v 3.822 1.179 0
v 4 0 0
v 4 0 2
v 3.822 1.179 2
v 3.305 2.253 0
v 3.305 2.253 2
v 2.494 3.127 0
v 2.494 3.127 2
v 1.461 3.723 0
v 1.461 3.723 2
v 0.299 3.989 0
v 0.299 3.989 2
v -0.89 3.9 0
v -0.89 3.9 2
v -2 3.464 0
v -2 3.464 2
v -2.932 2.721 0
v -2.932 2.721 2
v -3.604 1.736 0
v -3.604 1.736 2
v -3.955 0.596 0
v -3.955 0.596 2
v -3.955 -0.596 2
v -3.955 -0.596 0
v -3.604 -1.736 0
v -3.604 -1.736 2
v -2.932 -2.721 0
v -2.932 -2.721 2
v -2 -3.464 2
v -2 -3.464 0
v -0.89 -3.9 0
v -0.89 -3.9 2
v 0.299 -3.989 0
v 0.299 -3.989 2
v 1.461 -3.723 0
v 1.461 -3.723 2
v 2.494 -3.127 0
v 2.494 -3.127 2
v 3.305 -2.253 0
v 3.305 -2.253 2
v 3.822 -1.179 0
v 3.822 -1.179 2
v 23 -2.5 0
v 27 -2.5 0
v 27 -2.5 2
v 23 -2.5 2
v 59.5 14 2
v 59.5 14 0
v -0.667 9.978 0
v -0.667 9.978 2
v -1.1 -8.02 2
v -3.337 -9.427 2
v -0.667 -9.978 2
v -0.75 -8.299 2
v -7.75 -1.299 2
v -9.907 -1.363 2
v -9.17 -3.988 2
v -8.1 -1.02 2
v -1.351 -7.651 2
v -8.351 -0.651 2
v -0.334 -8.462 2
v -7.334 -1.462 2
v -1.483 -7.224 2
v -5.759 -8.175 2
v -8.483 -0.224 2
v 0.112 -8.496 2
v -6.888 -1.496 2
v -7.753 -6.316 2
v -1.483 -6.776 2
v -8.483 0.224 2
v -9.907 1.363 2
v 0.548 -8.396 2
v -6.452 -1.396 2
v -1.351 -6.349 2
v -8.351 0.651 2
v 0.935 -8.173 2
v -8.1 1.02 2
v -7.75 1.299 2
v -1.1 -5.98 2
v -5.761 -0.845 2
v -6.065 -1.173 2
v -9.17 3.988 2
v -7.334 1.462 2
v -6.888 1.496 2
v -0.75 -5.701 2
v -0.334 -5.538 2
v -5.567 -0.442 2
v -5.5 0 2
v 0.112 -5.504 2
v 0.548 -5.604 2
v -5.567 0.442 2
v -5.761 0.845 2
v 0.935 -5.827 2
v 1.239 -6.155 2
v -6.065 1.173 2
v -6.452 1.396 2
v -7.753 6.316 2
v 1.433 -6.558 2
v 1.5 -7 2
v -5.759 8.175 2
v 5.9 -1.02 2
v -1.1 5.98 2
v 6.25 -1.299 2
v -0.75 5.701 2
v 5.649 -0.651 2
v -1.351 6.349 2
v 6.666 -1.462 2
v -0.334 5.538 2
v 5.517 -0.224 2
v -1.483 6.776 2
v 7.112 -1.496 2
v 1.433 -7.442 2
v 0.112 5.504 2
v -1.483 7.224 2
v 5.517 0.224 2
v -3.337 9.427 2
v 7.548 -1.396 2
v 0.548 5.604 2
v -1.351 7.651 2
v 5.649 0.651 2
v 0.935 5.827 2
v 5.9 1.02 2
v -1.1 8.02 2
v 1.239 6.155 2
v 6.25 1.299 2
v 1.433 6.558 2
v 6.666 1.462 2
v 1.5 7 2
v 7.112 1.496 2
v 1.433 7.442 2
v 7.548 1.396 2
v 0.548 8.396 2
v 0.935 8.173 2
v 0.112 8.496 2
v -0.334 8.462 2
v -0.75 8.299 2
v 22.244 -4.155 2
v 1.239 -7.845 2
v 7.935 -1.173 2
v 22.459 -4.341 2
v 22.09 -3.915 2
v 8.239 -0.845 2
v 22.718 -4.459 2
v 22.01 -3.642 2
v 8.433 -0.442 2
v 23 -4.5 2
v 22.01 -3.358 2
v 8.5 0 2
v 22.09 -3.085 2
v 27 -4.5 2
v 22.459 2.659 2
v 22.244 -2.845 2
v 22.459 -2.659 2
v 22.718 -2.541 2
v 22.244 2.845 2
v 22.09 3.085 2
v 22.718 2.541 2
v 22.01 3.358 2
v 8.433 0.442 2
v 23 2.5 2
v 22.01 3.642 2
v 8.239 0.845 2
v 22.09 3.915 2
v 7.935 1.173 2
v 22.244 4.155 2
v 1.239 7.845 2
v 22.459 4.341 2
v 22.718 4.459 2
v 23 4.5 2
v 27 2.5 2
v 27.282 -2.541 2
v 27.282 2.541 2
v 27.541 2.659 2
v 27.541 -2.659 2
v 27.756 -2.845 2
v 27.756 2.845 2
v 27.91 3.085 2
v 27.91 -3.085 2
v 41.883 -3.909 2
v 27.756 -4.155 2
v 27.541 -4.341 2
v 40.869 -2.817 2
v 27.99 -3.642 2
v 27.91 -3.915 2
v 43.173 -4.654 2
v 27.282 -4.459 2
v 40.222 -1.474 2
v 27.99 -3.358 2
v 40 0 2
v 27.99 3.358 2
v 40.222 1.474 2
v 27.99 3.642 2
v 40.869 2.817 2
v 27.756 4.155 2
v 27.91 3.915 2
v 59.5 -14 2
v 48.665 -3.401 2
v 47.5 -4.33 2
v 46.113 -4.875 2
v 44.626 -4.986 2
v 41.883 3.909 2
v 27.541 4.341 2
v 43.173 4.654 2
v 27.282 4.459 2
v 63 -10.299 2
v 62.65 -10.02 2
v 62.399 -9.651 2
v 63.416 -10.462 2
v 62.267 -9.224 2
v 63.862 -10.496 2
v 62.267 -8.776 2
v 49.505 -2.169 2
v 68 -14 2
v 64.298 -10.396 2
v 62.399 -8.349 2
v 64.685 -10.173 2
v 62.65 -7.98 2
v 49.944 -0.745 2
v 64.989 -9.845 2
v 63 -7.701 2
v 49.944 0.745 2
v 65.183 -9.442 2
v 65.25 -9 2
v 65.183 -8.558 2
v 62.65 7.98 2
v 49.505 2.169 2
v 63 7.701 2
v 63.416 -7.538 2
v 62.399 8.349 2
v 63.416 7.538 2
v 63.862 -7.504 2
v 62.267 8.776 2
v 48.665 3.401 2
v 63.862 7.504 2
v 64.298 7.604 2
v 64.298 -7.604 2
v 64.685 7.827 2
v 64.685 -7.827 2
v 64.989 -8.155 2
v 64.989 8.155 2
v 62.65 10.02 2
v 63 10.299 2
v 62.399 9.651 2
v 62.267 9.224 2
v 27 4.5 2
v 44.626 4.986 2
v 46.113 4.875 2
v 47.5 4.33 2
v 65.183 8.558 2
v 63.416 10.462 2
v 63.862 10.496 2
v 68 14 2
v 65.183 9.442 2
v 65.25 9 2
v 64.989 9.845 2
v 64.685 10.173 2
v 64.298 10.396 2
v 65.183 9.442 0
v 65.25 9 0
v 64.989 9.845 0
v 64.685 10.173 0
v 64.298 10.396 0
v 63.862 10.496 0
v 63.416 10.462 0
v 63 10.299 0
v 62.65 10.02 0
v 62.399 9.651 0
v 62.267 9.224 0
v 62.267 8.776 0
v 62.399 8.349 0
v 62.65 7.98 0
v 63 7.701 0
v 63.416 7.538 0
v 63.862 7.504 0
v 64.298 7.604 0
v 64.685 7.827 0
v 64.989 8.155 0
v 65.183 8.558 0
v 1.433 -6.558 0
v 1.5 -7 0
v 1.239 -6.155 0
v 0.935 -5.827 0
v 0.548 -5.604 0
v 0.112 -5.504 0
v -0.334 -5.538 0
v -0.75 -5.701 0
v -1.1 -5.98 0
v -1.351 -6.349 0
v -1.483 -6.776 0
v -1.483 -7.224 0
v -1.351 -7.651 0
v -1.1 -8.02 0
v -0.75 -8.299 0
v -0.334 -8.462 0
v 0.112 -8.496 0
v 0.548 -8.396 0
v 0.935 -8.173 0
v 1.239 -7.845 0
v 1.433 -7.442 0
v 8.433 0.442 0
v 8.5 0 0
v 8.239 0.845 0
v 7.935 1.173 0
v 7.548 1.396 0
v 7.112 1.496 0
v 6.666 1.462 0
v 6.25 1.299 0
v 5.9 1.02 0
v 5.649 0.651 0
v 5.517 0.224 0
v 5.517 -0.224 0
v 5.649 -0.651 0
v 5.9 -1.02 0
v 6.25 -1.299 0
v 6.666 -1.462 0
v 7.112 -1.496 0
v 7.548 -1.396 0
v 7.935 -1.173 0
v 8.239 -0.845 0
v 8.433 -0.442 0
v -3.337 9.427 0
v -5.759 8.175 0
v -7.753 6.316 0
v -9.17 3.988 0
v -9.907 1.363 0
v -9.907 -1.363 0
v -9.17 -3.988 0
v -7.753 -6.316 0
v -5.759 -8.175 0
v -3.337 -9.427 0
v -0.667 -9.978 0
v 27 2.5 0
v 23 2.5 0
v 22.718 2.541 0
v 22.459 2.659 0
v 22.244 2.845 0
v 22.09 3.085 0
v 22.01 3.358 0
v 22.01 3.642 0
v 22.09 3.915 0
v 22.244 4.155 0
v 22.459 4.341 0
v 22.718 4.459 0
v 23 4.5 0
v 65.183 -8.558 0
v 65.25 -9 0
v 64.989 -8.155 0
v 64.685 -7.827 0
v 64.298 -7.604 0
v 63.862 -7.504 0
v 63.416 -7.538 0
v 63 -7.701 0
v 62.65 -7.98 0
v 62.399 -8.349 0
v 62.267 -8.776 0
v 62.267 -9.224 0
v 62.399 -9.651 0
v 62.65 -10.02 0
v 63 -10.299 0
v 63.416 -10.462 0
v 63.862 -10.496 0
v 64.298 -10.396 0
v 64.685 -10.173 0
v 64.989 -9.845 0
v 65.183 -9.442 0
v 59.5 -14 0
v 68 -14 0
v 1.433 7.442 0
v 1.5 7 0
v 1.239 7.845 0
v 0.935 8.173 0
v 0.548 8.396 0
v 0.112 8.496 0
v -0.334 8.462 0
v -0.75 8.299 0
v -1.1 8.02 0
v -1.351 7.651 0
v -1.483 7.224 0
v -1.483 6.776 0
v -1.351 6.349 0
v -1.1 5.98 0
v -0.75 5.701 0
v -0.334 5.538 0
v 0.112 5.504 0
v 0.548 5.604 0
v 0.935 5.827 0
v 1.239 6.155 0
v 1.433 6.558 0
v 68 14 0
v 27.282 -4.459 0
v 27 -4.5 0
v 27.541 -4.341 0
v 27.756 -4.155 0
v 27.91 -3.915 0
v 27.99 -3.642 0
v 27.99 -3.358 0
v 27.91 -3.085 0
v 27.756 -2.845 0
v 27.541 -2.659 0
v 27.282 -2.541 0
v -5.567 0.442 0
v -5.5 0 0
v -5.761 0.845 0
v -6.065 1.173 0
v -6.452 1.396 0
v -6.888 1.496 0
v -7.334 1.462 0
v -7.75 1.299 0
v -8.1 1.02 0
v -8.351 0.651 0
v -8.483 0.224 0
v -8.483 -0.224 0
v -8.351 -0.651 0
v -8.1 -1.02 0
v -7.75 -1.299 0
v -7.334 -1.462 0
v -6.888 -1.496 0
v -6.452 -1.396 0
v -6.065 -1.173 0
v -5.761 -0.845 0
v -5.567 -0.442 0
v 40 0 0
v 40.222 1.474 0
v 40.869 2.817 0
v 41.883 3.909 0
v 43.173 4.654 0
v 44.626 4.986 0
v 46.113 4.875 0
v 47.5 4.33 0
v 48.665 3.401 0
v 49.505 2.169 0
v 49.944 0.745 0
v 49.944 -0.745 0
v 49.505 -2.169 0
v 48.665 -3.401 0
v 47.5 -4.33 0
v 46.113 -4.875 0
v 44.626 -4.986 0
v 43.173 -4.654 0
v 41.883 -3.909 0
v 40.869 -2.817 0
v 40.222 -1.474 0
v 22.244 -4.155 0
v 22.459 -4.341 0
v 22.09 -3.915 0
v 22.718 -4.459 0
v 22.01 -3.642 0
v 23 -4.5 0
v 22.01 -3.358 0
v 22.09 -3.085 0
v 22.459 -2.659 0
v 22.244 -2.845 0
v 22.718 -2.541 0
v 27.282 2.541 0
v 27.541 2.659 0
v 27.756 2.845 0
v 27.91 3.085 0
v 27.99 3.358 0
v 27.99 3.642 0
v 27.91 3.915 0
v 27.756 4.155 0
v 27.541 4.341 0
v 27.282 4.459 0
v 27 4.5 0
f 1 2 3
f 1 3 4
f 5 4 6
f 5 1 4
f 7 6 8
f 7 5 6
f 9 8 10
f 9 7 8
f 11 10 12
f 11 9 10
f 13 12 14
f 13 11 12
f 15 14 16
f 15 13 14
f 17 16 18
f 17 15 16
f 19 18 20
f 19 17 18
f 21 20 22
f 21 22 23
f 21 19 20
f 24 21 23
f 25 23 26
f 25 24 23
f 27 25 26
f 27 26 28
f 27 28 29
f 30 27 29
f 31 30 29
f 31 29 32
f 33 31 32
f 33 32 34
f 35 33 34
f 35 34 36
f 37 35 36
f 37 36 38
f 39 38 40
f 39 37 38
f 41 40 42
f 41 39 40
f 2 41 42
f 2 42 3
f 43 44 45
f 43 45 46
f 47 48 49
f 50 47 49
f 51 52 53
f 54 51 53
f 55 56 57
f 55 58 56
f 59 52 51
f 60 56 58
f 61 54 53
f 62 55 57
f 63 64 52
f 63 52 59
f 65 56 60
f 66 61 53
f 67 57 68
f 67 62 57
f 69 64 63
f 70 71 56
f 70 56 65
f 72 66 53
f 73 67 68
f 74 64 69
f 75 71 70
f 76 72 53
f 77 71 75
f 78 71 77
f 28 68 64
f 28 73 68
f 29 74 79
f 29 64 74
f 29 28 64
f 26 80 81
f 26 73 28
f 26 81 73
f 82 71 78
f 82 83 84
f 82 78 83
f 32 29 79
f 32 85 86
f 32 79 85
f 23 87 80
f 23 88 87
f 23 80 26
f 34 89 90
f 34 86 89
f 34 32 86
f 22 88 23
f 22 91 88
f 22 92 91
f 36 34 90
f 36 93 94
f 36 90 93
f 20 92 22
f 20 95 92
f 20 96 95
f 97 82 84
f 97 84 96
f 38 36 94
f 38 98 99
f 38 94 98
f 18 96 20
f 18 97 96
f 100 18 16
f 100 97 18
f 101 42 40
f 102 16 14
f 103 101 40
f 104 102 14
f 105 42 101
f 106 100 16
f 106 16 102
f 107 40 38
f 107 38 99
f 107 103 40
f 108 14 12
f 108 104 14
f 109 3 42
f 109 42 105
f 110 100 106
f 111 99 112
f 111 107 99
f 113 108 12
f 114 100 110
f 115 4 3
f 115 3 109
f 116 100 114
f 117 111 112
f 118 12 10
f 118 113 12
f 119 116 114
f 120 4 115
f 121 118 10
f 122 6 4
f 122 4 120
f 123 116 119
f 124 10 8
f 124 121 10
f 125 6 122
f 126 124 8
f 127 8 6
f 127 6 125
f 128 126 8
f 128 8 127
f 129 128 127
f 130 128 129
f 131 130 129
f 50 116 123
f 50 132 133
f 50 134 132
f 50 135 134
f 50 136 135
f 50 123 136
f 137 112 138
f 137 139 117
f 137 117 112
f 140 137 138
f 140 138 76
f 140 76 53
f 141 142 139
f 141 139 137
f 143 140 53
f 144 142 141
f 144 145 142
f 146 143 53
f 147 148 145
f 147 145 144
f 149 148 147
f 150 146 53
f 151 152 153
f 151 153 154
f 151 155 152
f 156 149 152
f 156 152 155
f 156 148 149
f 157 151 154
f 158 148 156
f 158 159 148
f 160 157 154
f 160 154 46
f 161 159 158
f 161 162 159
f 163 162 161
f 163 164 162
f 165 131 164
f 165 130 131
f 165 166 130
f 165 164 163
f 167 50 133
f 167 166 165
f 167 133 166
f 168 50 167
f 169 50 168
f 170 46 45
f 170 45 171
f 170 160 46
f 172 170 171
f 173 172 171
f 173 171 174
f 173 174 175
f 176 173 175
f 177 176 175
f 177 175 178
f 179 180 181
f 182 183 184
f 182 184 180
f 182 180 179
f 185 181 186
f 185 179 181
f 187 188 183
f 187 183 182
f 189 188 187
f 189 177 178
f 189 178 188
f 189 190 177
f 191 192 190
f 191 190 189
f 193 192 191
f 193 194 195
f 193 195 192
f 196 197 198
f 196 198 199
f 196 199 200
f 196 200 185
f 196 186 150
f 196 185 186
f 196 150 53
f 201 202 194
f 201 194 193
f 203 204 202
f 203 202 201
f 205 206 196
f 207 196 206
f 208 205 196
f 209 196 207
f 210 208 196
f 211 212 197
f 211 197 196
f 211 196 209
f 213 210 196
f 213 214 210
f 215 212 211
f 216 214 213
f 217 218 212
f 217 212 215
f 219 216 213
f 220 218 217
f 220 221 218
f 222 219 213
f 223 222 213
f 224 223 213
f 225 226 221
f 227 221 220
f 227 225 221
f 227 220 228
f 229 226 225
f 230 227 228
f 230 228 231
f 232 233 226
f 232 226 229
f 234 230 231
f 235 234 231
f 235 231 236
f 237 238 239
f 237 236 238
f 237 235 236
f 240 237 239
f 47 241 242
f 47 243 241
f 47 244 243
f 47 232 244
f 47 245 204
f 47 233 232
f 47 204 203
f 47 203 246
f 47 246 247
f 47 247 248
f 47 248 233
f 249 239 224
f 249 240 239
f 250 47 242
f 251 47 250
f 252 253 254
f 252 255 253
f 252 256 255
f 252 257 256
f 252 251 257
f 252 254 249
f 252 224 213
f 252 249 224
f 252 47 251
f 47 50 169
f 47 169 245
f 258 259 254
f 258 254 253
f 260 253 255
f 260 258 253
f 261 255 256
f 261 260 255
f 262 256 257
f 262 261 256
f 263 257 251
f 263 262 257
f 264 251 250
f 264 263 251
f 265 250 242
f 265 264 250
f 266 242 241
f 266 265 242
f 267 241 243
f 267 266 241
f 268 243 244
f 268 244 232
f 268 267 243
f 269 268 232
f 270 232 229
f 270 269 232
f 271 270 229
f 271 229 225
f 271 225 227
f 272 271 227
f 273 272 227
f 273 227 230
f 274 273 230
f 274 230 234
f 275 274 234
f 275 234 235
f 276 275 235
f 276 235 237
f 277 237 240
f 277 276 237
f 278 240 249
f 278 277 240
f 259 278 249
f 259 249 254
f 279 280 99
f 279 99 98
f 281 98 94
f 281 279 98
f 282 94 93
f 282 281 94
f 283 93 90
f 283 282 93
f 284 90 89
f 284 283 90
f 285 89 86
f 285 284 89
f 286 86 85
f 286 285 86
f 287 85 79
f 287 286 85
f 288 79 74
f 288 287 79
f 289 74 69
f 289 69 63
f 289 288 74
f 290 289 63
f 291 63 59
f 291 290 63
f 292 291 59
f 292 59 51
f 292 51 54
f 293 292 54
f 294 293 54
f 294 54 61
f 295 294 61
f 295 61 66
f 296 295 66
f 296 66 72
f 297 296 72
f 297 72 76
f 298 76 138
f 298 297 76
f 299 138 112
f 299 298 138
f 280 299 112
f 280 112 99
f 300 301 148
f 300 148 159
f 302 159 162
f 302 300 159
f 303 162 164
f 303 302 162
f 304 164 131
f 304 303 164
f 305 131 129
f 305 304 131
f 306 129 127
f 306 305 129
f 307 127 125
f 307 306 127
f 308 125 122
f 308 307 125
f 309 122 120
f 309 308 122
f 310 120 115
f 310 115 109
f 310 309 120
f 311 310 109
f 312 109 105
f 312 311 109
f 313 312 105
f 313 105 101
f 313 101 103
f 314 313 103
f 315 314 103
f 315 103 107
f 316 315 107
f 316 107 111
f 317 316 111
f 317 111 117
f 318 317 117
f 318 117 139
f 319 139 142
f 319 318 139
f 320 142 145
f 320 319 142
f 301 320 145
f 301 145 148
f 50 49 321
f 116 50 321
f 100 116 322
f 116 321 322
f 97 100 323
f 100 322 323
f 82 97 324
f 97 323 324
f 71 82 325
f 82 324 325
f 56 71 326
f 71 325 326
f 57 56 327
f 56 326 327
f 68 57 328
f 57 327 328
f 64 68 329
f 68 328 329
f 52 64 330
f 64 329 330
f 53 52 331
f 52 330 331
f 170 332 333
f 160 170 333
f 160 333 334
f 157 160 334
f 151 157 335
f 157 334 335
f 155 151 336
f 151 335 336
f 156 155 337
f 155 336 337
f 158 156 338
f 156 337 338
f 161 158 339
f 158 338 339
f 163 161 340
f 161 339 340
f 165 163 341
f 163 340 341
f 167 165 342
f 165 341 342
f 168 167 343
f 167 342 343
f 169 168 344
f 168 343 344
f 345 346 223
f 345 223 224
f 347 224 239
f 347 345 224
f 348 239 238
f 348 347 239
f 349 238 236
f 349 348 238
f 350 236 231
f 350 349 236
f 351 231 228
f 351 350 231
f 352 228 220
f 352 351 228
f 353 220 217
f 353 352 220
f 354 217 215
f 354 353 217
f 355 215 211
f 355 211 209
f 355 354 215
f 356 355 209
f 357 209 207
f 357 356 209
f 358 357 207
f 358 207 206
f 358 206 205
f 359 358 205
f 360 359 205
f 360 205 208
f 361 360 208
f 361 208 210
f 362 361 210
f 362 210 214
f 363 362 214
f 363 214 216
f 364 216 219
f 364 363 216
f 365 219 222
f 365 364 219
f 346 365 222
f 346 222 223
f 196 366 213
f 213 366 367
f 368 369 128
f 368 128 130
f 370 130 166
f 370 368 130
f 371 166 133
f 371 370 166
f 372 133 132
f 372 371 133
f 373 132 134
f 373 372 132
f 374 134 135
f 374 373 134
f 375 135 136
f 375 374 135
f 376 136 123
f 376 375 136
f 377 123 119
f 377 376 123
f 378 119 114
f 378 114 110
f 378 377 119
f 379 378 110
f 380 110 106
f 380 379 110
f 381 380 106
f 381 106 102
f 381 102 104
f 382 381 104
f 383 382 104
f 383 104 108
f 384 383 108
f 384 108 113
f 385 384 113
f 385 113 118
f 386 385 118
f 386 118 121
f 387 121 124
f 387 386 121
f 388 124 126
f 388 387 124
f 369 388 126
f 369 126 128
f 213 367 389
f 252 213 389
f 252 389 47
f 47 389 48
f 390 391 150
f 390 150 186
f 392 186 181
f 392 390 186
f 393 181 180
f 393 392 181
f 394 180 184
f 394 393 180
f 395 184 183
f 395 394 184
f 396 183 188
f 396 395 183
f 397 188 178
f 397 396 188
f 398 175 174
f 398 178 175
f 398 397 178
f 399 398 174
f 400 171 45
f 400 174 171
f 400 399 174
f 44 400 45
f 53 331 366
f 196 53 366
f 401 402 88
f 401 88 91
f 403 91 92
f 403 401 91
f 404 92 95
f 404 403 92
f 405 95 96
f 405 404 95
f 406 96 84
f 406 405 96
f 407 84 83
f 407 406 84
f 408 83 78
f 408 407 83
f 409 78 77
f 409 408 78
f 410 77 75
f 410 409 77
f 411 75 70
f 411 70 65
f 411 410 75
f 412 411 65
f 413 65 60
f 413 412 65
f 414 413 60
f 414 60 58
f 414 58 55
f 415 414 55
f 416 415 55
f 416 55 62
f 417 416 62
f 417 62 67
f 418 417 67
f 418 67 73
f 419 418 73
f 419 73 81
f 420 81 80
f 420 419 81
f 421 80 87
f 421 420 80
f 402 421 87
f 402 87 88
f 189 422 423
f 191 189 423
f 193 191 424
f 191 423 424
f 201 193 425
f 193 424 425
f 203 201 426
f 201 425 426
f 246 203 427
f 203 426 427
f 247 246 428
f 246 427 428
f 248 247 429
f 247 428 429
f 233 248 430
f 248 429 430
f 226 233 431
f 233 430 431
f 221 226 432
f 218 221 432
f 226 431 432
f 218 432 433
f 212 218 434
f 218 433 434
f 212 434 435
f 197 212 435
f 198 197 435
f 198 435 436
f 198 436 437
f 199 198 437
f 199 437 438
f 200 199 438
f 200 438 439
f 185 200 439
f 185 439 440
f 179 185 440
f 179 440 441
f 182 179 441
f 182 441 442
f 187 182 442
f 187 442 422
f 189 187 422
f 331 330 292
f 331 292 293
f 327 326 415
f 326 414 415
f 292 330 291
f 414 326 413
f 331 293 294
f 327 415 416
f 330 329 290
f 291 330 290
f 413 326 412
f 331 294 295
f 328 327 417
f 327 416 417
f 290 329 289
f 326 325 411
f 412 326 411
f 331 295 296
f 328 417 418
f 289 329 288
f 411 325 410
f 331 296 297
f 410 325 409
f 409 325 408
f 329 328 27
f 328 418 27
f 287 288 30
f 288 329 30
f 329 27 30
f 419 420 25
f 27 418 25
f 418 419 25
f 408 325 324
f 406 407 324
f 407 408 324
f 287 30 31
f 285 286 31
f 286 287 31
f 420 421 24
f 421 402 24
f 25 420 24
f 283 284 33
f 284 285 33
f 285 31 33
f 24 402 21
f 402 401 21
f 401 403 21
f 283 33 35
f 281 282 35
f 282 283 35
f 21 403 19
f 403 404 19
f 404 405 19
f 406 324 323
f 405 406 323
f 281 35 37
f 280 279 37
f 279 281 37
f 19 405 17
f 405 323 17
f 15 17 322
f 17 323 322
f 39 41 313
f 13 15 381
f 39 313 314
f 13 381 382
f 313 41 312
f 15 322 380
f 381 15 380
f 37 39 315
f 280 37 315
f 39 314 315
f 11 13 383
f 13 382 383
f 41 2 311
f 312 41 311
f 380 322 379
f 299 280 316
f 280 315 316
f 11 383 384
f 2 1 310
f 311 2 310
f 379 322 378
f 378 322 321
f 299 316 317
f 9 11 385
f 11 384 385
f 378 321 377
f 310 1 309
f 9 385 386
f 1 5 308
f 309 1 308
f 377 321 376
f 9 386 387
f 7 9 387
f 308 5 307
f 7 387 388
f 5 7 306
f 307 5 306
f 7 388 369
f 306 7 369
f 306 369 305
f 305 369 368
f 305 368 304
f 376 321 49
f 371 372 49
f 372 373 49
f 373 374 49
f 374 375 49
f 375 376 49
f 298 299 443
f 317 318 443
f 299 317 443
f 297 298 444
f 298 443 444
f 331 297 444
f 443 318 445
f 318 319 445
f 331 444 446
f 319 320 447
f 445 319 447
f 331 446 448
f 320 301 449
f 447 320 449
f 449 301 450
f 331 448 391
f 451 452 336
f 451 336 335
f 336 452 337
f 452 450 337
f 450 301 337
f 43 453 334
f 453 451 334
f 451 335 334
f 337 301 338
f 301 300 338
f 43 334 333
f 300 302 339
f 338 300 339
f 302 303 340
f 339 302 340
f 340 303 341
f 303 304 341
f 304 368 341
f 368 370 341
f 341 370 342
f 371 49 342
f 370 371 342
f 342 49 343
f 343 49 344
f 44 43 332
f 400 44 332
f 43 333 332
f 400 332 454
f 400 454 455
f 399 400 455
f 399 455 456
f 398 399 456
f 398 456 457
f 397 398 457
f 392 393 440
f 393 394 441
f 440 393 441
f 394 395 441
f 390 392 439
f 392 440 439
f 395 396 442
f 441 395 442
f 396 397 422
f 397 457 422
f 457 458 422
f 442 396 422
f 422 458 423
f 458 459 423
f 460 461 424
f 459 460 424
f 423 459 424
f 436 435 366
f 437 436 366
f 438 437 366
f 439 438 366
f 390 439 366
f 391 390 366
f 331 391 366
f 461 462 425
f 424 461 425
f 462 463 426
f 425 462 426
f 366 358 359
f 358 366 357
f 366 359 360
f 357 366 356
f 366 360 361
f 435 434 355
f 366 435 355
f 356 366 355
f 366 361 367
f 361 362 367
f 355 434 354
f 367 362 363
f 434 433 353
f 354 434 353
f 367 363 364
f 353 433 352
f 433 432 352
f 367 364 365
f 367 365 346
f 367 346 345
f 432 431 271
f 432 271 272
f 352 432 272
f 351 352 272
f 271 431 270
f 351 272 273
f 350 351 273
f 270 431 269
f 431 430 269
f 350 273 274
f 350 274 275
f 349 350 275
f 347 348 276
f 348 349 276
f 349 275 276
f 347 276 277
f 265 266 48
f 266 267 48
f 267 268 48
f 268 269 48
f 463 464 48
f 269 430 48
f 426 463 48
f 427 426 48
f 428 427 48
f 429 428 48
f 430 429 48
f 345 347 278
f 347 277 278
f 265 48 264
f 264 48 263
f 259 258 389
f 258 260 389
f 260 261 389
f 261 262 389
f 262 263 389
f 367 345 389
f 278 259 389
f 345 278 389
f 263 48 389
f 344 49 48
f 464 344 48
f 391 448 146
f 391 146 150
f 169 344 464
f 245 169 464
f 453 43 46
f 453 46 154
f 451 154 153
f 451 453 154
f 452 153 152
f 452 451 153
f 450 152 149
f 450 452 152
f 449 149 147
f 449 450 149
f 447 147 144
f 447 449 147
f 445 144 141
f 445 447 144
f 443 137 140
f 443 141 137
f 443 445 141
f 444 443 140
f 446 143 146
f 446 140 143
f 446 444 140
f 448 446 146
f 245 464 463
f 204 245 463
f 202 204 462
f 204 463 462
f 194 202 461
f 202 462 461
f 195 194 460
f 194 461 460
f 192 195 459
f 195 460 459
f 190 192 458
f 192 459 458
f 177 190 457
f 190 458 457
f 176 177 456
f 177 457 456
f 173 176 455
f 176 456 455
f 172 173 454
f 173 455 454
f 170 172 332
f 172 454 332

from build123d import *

# Parameters (mm, degrees)
SKETCH1_R          = 4
SKETCH1_R_2        = 1.5
EXTRUDE_1319_DEPTH = 2
SKETCH3_R          = 5
EXTRUDE3_DEPTH     = 70.455021417


with BuildPart() as part:
    # Sketch1 → Extrude 1319 (new body)
    with BuildSketch(Plane.XY):
        with BuildLine():
            Line((59.5, -14), (68, -14))
            Line((68, -14), (68, 14))
            Line((68, 14), (59.5, 14))
            Line((59.5, 14), (-0.667028635, 9.97772884))
            ThreePointArc((-0.667028635, 9.97772884), (-10, 0), (-0.667028635, -9.97772884))
            Line((-0.667028635, -9.97772884), (59.5, -14))
        make_face()
        Circle(SKETCH1_R, mode=Mode.SUBTRACT)
        with Locations((7, 0)):
            Circle(SKETCH1_R_2, mode=Mode.SUBTRACT)
        with Locations((0, -7)):
            Circle(SKETCH1_R_2, mode=Mode.SUBTRACT)
        with Locations((-7, 0)):
            Circle(SKETCH1_R_2, mode=Mode.SUBTRACT)
        with Locations((0, 7)):
            Circle(SKETCH1_R_2, mode=Mode.SUBTRACT)
        with Locations((63.75, -9)):
            Circle(SKETCH1_R_2, mode=Mode.SUBTRACT)
        with Locations((63.75, 9)):
            Circle(SKETCH1_R_2, mode=Mode.SUBTRACT)
    extrude(amount=EXTRUDE_1319_DEPTH)

    # Sketch3 → Extrude3 (cut, through all)
    with BuildSketch(Plane(origin=(0, 0, 0), x_dir=(-1, 0, 0), z_dir=(0, 0, -1))):
        with Locations((-45, 0)):
            Circle(SKETCH3_R)
        with BuildLine():
            Line((-27, -2.5), (-23, -2.5))
            ThreePointArc((-23, -2.5), (-22, -3.5), (-23, -4.5))
            Line((-23, -4.5), (-27, -4.5))
            ThreePointArc((-27, -4.5), (-28, -3.5), (-27, -2.5))
        make_face()
        with BuildLine():
            Line((-27, 2.5), (-23, 2.5))
            ThreePointArc((-23, 2.5), (-22, 3.5), (-23, 4.5))
            Line((-23, 4.5), (-27, 4.5))
            ThreePointArc((-27, 4.5), (-28, 3.5), (-27, 2.5))
        make_face()
    extrude(amount=-EXTRUDE3_DEPTH, mode=Mode.SUBTRACT)


solid = part.part
